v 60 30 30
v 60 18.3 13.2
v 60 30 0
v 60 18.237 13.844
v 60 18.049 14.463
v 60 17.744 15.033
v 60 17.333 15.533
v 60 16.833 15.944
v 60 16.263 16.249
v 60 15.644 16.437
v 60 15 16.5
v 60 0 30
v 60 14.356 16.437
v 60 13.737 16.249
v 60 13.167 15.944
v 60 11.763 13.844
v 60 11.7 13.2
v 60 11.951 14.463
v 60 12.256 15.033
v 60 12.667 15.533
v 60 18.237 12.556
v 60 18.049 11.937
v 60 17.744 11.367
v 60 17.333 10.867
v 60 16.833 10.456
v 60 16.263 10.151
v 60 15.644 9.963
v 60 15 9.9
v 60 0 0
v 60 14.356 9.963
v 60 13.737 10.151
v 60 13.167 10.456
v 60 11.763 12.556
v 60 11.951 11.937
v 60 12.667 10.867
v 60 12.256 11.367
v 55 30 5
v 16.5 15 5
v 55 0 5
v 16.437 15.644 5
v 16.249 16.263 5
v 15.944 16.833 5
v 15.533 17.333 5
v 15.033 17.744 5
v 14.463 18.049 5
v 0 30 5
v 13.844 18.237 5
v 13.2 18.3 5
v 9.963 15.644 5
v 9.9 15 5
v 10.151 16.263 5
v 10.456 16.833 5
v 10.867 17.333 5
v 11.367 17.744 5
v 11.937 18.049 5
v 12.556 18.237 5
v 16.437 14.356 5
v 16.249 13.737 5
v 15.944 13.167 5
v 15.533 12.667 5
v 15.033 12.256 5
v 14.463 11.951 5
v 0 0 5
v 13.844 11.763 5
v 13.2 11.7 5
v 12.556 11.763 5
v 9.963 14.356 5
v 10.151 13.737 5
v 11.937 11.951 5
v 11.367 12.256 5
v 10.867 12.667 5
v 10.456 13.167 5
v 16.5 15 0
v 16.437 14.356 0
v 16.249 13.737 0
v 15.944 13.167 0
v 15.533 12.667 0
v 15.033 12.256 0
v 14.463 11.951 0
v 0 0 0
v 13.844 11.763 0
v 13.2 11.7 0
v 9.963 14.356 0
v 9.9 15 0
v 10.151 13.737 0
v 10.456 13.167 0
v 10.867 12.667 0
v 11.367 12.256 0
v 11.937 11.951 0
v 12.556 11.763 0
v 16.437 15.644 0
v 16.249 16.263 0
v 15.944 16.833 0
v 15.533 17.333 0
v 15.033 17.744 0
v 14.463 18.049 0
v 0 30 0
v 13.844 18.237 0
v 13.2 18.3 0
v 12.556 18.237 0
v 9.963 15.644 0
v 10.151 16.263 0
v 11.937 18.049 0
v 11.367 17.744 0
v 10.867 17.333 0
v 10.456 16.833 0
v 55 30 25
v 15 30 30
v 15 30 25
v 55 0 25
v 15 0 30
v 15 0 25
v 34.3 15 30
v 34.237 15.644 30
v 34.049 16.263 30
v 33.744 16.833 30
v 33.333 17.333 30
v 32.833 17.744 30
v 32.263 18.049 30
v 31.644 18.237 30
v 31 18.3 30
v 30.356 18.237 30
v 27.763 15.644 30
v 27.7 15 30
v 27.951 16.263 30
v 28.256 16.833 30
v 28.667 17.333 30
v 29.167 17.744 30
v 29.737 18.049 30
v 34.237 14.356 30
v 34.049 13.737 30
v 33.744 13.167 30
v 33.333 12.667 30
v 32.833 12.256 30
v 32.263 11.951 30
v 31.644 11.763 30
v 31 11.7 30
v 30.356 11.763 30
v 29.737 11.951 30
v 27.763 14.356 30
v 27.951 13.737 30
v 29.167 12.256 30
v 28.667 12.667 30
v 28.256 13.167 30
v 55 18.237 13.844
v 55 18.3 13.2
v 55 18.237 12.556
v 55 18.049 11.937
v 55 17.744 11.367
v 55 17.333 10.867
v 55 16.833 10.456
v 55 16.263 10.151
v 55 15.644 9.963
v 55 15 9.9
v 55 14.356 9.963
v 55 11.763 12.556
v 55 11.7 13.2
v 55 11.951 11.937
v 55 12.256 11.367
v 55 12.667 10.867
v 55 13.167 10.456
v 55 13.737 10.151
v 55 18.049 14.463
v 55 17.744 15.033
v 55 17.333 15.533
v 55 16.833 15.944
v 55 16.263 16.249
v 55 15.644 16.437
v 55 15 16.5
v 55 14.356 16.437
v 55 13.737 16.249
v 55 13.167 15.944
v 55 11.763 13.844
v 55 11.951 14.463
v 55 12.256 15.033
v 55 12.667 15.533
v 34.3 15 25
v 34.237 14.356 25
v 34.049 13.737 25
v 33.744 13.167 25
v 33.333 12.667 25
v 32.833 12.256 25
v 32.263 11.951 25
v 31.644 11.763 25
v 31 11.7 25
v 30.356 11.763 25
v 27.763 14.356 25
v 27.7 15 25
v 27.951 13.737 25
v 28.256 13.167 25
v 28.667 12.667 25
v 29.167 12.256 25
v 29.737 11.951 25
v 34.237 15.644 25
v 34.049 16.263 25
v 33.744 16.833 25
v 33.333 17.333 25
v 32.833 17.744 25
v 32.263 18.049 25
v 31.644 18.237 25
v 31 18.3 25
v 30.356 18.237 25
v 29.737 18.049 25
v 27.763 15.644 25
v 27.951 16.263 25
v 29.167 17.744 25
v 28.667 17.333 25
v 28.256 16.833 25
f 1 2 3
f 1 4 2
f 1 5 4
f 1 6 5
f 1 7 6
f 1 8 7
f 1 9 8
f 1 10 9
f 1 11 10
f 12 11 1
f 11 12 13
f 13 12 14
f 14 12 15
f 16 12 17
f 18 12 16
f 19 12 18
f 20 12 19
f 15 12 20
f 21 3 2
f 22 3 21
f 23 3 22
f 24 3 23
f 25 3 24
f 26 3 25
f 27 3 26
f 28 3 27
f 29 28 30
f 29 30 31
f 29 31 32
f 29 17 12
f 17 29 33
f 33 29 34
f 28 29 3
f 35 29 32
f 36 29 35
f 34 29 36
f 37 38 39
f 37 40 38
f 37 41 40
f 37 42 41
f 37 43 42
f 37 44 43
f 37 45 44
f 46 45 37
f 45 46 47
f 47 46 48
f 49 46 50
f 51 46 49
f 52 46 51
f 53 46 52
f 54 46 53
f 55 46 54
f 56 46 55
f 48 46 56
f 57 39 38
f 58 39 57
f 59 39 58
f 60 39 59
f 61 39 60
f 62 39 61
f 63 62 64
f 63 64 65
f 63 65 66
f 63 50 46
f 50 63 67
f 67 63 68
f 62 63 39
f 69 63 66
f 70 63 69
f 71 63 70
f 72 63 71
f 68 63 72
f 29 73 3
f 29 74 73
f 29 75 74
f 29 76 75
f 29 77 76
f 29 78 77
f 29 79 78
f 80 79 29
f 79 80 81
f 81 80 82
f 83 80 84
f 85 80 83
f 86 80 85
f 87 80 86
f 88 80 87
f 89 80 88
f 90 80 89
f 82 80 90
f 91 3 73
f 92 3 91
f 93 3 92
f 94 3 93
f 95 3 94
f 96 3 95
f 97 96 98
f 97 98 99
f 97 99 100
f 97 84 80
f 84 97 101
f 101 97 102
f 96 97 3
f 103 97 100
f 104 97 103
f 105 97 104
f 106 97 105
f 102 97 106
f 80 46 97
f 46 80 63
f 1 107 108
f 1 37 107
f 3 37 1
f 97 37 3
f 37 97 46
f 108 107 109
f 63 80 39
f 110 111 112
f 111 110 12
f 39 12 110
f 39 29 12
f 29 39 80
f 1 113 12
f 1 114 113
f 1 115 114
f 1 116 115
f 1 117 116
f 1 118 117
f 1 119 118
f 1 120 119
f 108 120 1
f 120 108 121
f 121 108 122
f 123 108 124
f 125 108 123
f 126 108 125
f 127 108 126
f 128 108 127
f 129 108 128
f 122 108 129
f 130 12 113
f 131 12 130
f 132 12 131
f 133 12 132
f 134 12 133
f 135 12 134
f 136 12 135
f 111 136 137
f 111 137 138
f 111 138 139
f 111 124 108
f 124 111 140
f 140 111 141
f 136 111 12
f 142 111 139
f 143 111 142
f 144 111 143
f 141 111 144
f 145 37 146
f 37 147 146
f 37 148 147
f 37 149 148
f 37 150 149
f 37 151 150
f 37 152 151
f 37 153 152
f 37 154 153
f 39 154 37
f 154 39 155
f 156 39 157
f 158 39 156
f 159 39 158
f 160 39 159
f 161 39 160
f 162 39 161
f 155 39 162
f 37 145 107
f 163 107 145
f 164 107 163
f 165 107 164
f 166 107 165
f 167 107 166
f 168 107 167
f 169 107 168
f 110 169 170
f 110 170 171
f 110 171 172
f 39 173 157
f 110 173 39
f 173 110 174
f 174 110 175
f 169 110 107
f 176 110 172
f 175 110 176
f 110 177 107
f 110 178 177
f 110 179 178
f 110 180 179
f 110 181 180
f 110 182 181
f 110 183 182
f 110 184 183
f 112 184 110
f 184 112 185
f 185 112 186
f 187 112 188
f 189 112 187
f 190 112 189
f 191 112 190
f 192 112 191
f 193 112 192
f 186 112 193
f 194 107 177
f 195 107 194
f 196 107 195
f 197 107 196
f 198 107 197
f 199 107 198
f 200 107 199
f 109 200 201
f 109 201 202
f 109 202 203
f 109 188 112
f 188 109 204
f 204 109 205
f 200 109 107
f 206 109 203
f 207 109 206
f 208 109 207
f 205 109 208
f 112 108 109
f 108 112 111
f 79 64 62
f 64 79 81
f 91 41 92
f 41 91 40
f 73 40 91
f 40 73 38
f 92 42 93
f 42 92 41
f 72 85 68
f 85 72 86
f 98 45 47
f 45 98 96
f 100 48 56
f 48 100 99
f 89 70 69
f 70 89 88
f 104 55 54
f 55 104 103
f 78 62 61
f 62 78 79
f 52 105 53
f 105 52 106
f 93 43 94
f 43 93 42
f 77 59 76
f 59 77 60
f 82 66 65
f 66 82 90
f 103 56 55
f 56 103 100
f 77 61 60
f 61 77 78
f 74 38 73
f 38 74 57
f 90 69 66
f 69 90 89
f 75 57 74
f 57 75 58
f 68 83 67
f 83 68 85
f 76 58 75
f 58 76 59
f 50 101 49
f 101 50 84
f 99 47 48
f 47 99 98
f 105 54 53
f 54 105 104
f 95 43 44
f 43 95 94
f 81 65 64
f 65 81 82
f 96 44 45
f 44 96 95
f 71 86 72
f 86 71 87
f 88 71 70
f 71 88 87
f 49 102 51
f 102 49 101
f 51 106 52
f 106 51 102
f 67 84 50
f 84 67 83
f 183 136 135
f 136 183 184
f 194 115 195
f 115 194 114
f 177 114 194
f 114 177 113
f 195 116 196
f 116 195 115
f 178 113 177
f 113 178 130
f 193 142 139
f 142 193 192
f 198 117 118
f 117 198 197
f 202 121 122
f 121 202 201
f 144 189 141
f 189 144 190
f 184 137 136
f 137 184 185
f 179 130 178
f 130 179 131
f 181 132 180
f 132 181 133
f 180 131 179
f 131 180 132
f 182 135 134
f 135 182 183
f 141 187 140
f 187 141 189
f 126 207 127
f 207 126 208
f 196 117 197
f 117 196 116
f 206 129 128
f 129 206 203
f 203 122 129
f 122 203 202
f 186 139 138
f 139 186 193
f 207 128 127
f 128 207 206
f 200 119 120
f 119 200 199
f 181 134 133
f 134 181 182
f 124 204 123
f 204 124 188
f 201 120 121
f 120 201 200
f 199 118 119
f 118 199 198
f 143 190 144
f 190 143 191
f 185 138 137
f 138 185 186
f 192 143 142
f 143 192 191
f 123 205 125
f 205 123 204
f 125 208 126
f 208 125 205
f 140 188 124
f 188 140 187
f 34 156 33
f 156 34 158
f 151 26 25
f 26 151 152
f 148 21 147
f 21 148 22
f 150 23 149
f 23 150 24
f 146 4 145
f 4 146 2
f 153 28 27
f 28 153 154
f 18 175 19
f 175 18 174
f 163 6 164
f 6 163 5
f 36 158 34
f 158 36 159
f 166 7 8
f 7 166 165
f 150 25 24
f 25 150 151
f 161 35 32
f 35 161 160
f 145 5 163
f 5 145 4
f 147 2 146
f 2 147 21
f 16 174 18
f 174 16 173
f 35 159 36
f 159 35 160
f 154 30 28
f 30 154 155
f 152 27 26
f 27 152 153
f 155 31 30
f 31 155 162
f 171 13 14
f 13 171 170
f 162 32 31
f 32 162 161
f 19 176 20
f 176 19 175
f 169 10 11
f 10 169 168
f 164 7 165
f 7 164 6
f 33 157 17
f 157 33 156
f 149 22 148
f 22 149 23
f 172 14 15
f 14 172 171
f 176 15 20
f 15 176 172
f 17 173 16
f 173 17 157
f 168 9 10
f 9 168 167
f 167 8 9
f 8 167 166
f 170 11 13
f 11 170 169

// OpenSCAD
$fn = 32;

// ----------------------------------------------------------------------
// Z-bracket: 60 x 30 x 30 mm
// ----------------------------------------------------------------------

// --- parameters (mm) ---
bottom_run = 60;          // lower foot length, X
top_run = 40;             // upper foot length, X
profile_w = 30;           // bracket width, Y
height = 30;              // overall rise, Z
mat_t = 5;                // plate thickness
hole_d = 6.6;             // clearance for M6

module hole_z(px, py, z0) {
  translate([px, py, z0 - 0.5]) cylinder(h = mat_t + 1, d = hole_d);
}
module hole_x(py, pz) {
  translate([-0.5, py, pz]) rotate([0, 90, 0]) cylinder(h = mat_t + 1, d = hole_d);
}

difference() {
  union() {
    cube([bottom_run, profile_w, mat_t]);
    /* web, overlapping the lower foot */
    translate([bottom_run - mat_t, 0, 0]) cube([mat_t, profile_w, height]);
    /* upper foot, sunk into the web */
    translate([bottom_run - mat_t - top_run, 0, height - mat_t]) cube([top_run + mat_t, profile_w, mat_t]);
  }
  hole_z(13.2, 15, 0);
  translate([bottom_run - mat_t - 24, 0, 0]) hole_z(0, 15, height - mat_t);
  translate([bottom_run - mat_t, 0, 0]) hole_x(15, 13.2);
}
